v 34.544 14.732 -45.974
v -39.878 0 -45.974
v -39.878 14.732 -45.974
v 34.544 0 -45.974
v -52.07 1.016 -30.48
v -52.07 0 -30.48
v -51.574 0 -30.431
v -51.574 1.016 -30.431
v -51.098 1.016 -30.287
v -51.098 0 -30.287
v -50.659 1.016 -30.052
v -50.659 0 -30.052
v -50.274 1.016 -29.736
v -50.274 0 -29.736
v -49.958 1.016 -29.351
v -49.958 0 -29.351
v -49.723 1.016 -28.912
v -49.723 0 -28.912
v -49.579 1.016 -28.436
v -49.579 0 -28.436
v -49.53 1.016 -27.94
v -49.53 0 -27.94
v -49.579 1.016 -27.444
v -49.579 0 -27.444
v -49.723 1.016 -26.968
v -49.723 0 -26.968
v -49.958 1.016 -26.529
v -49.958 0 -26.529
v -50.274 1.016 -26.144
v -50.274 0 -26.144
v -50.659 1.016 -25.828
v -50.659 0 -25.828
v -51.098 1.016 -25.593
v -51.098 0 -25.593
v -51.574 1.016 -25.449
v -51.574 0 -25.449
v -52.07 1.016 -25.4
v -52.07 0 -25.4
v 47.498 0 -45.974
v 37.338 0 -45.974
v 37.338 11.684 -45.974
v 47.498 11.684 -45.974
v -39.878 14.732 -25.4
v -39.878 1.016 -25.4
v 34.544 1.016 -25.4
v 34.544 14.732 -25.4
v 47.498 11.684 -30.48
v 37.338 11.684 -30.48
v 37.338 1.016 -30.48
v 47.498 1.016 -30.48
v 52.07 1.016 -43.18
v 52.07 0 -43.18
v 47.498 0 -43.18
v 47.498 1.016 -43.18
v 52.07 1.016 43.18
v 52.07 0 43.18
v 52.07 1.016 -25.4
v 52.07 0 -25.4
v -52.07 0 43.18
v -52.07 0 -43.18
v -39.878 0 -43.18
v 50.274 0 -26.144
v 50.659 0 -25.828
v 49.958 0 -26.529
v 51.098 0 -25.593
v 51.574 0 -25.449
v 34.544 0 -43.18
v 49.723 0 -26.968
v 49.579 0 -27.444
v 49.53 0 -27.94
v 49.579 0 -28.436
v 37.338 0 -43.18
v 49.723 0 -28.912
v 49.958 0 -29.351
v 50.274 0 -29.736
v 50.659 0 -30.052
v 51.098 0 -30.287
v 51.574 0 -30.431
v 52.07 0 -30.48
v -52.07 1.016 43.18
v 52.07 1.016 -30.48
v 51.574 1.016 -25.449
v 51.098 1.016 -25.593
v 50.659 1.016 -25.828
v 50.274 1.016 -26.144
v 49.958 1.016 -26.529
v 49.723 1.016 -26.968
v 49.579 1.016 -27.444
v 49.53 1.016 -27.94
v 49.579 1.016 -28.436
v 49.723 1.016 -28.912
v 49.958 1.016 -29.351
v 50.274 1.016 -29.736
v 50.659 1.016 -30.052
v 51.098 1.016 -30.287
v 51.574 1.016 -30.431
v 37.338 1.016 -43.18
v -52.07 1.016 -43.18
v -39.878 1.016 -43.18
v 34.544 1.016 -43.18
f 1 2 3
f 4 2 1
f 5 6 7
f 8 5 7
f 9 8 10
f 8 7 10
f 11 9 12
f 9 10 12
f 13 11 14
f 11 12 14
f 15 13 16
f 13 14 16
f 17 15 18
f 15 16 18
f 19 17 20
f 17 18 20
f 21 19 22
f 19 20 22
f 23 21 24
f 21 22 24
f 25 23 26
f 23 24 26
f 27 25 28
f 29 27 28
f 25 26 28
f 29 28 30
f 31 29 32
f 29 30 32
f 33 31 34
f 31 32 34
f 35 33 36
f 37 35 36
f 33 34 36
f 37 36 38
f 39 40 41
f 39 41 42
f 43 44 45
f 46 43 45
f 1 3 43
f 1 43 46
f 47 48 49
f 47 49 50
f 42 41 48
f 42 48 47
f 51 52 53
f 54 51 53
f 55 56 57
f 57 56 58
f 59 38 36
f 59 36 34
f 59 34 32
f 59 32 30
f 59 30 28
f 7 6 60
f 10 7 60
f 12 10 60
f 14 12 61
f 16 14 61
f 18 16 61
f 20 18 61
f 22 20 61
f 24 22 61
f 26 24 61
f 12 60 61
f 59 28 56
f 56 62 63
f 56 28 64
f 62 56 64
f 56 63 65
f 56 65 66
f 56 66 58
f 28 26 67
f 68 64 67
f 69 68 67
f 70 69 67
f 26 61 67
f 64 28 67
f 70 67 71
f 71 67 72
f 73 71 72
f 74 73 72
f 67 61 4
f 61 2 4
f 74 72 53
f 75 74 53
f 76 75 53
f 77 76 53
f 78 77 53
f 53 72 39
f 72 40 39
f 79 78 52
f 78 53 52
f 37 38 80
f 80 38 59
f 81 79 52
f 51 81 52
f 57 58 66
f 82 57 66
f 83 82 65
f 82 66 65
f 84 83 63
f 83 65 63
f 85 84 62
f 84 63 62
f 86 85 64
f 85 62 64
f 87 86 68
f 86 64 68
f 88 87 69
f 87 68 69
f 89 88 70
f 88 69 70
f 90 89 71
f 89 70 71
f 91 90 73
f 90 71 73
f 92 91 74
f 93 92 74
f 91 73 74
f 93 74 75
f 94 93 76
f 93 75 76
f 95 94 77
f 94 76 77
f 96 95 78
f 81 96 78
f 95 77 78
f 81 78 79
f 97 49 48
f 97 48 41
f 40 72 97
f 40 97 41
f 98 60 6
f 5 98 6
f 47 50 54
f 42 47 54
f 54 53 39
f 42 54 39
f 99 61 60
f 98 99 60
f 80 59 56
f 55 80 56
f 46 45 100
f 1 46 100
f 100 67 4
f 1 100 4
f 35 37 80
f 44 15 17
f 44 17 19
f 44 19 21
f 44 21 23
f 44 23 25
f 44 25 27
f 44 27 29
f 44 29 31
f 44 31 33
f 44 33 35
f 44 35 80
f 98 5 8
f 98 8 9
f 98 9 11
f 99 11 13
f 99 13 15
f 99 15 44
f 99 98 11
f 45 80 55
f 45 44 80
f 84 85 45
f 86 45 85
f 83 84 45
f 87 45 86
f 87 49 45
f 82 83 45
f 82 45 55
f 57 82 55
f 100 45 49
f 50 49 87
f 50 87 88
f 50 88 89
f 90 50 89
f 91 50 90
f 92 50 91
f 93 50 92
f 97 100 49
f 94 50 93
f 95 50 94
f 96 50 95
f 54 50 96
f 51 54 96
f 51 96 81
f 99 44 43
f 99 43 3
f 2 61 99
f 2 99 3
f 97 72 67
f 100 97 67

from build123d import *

# Parameters (mm, degrees)
SKETCH2_W           = 74.422
SKETCH2_H           = 20.574
BOSS_EXTRUDE3_DEPTH = 14.732
SKETCH7_W           = 10.16
SKETCH7_H           = 15.494
BOSS_EXTRUDE4_DEPTH = 11.684
BOSS_EXTRUDE5_DEPTH = 1.016


with BuildPart() as part:
    # Sketch2 → Boss-Extrude3 (new body)
    with BuildSketch(Plane(origin=(0, 0, 0), x_dir=(1, 0, 0), z_dir=(0, 1, 0))):
        with Locations((-2.667, 35.687)):
            Rectangle(SKETCH2_W, SKETCH2_H)
    extrude(amount=BOSS_EXTRUDE3_DEPTH)



with BuildPart() as body_2:
    # Sketch7 → Boss-Extrude4 (new body)
    with BuildSketch(Plane(origin=(0, 0, 0), x_dir=(1, 0, 0), z_dir=(0, 1, 0))):
        with Locations((42.418, 38.227)):
            Rectangle(SKETCH7_W, SKETCH7_H)
    extrude(amount=BOSS_EXTRUDE4_DEPTH)


with BuildPart() as part_1:
    add(part.part)

    add(body_2.part)  # Boss-Extrude5 merges body 2
    # Sketch9 → Boss-Extrude5 (add)
    with BuildSketch(Plane(origin=(0, 0, 0), x_dir=(1, 0, 0), z_dir=(0, 1, 0))):
        with BuildLine():
            Line((-39.878, 43.18), (-52.07, 43.18))
            Line((-52.07, 43.18), (-52.07, 30.48))
            ThreePointArc((-52.07, 30.48), (-49.53, 27.94), (-52.07, 25.4))
            Line((-52.07, 25.4), (-52.07, -43.18))
            Line((-52.07, -43.18), (52.07, -43.18))
            Line((52.07, -43.18), (52.07, 25.4))
            ThreePointArc((52.07, 25.4), (49.53, 27.94), (52.07, 30.48))
            Line((52.07, 30.48), (52.07, 43.18))
            Line((52.07, 43.18), (47.498, 43.18))
            Line((47.498, 43.18), (47.498, 30.48))
            Line((47.498, 30.48), (37.338, 30.48))
            Line((37.338, 30.48), (37.338, 43.18))
            Line((37.338, 43.18), (34.544, 43.18))
            Line((34.544, 43.18), (34.544, 25.4))
            Line((34.544, 25.4), (-39.878, 25.4))
            Line((-39.878, 25.4), (-39.878, 43.18))
        make_face()
    extrude(amount=BOSS_EXTRUDE5_DEPTH)


solid = part_1.part
